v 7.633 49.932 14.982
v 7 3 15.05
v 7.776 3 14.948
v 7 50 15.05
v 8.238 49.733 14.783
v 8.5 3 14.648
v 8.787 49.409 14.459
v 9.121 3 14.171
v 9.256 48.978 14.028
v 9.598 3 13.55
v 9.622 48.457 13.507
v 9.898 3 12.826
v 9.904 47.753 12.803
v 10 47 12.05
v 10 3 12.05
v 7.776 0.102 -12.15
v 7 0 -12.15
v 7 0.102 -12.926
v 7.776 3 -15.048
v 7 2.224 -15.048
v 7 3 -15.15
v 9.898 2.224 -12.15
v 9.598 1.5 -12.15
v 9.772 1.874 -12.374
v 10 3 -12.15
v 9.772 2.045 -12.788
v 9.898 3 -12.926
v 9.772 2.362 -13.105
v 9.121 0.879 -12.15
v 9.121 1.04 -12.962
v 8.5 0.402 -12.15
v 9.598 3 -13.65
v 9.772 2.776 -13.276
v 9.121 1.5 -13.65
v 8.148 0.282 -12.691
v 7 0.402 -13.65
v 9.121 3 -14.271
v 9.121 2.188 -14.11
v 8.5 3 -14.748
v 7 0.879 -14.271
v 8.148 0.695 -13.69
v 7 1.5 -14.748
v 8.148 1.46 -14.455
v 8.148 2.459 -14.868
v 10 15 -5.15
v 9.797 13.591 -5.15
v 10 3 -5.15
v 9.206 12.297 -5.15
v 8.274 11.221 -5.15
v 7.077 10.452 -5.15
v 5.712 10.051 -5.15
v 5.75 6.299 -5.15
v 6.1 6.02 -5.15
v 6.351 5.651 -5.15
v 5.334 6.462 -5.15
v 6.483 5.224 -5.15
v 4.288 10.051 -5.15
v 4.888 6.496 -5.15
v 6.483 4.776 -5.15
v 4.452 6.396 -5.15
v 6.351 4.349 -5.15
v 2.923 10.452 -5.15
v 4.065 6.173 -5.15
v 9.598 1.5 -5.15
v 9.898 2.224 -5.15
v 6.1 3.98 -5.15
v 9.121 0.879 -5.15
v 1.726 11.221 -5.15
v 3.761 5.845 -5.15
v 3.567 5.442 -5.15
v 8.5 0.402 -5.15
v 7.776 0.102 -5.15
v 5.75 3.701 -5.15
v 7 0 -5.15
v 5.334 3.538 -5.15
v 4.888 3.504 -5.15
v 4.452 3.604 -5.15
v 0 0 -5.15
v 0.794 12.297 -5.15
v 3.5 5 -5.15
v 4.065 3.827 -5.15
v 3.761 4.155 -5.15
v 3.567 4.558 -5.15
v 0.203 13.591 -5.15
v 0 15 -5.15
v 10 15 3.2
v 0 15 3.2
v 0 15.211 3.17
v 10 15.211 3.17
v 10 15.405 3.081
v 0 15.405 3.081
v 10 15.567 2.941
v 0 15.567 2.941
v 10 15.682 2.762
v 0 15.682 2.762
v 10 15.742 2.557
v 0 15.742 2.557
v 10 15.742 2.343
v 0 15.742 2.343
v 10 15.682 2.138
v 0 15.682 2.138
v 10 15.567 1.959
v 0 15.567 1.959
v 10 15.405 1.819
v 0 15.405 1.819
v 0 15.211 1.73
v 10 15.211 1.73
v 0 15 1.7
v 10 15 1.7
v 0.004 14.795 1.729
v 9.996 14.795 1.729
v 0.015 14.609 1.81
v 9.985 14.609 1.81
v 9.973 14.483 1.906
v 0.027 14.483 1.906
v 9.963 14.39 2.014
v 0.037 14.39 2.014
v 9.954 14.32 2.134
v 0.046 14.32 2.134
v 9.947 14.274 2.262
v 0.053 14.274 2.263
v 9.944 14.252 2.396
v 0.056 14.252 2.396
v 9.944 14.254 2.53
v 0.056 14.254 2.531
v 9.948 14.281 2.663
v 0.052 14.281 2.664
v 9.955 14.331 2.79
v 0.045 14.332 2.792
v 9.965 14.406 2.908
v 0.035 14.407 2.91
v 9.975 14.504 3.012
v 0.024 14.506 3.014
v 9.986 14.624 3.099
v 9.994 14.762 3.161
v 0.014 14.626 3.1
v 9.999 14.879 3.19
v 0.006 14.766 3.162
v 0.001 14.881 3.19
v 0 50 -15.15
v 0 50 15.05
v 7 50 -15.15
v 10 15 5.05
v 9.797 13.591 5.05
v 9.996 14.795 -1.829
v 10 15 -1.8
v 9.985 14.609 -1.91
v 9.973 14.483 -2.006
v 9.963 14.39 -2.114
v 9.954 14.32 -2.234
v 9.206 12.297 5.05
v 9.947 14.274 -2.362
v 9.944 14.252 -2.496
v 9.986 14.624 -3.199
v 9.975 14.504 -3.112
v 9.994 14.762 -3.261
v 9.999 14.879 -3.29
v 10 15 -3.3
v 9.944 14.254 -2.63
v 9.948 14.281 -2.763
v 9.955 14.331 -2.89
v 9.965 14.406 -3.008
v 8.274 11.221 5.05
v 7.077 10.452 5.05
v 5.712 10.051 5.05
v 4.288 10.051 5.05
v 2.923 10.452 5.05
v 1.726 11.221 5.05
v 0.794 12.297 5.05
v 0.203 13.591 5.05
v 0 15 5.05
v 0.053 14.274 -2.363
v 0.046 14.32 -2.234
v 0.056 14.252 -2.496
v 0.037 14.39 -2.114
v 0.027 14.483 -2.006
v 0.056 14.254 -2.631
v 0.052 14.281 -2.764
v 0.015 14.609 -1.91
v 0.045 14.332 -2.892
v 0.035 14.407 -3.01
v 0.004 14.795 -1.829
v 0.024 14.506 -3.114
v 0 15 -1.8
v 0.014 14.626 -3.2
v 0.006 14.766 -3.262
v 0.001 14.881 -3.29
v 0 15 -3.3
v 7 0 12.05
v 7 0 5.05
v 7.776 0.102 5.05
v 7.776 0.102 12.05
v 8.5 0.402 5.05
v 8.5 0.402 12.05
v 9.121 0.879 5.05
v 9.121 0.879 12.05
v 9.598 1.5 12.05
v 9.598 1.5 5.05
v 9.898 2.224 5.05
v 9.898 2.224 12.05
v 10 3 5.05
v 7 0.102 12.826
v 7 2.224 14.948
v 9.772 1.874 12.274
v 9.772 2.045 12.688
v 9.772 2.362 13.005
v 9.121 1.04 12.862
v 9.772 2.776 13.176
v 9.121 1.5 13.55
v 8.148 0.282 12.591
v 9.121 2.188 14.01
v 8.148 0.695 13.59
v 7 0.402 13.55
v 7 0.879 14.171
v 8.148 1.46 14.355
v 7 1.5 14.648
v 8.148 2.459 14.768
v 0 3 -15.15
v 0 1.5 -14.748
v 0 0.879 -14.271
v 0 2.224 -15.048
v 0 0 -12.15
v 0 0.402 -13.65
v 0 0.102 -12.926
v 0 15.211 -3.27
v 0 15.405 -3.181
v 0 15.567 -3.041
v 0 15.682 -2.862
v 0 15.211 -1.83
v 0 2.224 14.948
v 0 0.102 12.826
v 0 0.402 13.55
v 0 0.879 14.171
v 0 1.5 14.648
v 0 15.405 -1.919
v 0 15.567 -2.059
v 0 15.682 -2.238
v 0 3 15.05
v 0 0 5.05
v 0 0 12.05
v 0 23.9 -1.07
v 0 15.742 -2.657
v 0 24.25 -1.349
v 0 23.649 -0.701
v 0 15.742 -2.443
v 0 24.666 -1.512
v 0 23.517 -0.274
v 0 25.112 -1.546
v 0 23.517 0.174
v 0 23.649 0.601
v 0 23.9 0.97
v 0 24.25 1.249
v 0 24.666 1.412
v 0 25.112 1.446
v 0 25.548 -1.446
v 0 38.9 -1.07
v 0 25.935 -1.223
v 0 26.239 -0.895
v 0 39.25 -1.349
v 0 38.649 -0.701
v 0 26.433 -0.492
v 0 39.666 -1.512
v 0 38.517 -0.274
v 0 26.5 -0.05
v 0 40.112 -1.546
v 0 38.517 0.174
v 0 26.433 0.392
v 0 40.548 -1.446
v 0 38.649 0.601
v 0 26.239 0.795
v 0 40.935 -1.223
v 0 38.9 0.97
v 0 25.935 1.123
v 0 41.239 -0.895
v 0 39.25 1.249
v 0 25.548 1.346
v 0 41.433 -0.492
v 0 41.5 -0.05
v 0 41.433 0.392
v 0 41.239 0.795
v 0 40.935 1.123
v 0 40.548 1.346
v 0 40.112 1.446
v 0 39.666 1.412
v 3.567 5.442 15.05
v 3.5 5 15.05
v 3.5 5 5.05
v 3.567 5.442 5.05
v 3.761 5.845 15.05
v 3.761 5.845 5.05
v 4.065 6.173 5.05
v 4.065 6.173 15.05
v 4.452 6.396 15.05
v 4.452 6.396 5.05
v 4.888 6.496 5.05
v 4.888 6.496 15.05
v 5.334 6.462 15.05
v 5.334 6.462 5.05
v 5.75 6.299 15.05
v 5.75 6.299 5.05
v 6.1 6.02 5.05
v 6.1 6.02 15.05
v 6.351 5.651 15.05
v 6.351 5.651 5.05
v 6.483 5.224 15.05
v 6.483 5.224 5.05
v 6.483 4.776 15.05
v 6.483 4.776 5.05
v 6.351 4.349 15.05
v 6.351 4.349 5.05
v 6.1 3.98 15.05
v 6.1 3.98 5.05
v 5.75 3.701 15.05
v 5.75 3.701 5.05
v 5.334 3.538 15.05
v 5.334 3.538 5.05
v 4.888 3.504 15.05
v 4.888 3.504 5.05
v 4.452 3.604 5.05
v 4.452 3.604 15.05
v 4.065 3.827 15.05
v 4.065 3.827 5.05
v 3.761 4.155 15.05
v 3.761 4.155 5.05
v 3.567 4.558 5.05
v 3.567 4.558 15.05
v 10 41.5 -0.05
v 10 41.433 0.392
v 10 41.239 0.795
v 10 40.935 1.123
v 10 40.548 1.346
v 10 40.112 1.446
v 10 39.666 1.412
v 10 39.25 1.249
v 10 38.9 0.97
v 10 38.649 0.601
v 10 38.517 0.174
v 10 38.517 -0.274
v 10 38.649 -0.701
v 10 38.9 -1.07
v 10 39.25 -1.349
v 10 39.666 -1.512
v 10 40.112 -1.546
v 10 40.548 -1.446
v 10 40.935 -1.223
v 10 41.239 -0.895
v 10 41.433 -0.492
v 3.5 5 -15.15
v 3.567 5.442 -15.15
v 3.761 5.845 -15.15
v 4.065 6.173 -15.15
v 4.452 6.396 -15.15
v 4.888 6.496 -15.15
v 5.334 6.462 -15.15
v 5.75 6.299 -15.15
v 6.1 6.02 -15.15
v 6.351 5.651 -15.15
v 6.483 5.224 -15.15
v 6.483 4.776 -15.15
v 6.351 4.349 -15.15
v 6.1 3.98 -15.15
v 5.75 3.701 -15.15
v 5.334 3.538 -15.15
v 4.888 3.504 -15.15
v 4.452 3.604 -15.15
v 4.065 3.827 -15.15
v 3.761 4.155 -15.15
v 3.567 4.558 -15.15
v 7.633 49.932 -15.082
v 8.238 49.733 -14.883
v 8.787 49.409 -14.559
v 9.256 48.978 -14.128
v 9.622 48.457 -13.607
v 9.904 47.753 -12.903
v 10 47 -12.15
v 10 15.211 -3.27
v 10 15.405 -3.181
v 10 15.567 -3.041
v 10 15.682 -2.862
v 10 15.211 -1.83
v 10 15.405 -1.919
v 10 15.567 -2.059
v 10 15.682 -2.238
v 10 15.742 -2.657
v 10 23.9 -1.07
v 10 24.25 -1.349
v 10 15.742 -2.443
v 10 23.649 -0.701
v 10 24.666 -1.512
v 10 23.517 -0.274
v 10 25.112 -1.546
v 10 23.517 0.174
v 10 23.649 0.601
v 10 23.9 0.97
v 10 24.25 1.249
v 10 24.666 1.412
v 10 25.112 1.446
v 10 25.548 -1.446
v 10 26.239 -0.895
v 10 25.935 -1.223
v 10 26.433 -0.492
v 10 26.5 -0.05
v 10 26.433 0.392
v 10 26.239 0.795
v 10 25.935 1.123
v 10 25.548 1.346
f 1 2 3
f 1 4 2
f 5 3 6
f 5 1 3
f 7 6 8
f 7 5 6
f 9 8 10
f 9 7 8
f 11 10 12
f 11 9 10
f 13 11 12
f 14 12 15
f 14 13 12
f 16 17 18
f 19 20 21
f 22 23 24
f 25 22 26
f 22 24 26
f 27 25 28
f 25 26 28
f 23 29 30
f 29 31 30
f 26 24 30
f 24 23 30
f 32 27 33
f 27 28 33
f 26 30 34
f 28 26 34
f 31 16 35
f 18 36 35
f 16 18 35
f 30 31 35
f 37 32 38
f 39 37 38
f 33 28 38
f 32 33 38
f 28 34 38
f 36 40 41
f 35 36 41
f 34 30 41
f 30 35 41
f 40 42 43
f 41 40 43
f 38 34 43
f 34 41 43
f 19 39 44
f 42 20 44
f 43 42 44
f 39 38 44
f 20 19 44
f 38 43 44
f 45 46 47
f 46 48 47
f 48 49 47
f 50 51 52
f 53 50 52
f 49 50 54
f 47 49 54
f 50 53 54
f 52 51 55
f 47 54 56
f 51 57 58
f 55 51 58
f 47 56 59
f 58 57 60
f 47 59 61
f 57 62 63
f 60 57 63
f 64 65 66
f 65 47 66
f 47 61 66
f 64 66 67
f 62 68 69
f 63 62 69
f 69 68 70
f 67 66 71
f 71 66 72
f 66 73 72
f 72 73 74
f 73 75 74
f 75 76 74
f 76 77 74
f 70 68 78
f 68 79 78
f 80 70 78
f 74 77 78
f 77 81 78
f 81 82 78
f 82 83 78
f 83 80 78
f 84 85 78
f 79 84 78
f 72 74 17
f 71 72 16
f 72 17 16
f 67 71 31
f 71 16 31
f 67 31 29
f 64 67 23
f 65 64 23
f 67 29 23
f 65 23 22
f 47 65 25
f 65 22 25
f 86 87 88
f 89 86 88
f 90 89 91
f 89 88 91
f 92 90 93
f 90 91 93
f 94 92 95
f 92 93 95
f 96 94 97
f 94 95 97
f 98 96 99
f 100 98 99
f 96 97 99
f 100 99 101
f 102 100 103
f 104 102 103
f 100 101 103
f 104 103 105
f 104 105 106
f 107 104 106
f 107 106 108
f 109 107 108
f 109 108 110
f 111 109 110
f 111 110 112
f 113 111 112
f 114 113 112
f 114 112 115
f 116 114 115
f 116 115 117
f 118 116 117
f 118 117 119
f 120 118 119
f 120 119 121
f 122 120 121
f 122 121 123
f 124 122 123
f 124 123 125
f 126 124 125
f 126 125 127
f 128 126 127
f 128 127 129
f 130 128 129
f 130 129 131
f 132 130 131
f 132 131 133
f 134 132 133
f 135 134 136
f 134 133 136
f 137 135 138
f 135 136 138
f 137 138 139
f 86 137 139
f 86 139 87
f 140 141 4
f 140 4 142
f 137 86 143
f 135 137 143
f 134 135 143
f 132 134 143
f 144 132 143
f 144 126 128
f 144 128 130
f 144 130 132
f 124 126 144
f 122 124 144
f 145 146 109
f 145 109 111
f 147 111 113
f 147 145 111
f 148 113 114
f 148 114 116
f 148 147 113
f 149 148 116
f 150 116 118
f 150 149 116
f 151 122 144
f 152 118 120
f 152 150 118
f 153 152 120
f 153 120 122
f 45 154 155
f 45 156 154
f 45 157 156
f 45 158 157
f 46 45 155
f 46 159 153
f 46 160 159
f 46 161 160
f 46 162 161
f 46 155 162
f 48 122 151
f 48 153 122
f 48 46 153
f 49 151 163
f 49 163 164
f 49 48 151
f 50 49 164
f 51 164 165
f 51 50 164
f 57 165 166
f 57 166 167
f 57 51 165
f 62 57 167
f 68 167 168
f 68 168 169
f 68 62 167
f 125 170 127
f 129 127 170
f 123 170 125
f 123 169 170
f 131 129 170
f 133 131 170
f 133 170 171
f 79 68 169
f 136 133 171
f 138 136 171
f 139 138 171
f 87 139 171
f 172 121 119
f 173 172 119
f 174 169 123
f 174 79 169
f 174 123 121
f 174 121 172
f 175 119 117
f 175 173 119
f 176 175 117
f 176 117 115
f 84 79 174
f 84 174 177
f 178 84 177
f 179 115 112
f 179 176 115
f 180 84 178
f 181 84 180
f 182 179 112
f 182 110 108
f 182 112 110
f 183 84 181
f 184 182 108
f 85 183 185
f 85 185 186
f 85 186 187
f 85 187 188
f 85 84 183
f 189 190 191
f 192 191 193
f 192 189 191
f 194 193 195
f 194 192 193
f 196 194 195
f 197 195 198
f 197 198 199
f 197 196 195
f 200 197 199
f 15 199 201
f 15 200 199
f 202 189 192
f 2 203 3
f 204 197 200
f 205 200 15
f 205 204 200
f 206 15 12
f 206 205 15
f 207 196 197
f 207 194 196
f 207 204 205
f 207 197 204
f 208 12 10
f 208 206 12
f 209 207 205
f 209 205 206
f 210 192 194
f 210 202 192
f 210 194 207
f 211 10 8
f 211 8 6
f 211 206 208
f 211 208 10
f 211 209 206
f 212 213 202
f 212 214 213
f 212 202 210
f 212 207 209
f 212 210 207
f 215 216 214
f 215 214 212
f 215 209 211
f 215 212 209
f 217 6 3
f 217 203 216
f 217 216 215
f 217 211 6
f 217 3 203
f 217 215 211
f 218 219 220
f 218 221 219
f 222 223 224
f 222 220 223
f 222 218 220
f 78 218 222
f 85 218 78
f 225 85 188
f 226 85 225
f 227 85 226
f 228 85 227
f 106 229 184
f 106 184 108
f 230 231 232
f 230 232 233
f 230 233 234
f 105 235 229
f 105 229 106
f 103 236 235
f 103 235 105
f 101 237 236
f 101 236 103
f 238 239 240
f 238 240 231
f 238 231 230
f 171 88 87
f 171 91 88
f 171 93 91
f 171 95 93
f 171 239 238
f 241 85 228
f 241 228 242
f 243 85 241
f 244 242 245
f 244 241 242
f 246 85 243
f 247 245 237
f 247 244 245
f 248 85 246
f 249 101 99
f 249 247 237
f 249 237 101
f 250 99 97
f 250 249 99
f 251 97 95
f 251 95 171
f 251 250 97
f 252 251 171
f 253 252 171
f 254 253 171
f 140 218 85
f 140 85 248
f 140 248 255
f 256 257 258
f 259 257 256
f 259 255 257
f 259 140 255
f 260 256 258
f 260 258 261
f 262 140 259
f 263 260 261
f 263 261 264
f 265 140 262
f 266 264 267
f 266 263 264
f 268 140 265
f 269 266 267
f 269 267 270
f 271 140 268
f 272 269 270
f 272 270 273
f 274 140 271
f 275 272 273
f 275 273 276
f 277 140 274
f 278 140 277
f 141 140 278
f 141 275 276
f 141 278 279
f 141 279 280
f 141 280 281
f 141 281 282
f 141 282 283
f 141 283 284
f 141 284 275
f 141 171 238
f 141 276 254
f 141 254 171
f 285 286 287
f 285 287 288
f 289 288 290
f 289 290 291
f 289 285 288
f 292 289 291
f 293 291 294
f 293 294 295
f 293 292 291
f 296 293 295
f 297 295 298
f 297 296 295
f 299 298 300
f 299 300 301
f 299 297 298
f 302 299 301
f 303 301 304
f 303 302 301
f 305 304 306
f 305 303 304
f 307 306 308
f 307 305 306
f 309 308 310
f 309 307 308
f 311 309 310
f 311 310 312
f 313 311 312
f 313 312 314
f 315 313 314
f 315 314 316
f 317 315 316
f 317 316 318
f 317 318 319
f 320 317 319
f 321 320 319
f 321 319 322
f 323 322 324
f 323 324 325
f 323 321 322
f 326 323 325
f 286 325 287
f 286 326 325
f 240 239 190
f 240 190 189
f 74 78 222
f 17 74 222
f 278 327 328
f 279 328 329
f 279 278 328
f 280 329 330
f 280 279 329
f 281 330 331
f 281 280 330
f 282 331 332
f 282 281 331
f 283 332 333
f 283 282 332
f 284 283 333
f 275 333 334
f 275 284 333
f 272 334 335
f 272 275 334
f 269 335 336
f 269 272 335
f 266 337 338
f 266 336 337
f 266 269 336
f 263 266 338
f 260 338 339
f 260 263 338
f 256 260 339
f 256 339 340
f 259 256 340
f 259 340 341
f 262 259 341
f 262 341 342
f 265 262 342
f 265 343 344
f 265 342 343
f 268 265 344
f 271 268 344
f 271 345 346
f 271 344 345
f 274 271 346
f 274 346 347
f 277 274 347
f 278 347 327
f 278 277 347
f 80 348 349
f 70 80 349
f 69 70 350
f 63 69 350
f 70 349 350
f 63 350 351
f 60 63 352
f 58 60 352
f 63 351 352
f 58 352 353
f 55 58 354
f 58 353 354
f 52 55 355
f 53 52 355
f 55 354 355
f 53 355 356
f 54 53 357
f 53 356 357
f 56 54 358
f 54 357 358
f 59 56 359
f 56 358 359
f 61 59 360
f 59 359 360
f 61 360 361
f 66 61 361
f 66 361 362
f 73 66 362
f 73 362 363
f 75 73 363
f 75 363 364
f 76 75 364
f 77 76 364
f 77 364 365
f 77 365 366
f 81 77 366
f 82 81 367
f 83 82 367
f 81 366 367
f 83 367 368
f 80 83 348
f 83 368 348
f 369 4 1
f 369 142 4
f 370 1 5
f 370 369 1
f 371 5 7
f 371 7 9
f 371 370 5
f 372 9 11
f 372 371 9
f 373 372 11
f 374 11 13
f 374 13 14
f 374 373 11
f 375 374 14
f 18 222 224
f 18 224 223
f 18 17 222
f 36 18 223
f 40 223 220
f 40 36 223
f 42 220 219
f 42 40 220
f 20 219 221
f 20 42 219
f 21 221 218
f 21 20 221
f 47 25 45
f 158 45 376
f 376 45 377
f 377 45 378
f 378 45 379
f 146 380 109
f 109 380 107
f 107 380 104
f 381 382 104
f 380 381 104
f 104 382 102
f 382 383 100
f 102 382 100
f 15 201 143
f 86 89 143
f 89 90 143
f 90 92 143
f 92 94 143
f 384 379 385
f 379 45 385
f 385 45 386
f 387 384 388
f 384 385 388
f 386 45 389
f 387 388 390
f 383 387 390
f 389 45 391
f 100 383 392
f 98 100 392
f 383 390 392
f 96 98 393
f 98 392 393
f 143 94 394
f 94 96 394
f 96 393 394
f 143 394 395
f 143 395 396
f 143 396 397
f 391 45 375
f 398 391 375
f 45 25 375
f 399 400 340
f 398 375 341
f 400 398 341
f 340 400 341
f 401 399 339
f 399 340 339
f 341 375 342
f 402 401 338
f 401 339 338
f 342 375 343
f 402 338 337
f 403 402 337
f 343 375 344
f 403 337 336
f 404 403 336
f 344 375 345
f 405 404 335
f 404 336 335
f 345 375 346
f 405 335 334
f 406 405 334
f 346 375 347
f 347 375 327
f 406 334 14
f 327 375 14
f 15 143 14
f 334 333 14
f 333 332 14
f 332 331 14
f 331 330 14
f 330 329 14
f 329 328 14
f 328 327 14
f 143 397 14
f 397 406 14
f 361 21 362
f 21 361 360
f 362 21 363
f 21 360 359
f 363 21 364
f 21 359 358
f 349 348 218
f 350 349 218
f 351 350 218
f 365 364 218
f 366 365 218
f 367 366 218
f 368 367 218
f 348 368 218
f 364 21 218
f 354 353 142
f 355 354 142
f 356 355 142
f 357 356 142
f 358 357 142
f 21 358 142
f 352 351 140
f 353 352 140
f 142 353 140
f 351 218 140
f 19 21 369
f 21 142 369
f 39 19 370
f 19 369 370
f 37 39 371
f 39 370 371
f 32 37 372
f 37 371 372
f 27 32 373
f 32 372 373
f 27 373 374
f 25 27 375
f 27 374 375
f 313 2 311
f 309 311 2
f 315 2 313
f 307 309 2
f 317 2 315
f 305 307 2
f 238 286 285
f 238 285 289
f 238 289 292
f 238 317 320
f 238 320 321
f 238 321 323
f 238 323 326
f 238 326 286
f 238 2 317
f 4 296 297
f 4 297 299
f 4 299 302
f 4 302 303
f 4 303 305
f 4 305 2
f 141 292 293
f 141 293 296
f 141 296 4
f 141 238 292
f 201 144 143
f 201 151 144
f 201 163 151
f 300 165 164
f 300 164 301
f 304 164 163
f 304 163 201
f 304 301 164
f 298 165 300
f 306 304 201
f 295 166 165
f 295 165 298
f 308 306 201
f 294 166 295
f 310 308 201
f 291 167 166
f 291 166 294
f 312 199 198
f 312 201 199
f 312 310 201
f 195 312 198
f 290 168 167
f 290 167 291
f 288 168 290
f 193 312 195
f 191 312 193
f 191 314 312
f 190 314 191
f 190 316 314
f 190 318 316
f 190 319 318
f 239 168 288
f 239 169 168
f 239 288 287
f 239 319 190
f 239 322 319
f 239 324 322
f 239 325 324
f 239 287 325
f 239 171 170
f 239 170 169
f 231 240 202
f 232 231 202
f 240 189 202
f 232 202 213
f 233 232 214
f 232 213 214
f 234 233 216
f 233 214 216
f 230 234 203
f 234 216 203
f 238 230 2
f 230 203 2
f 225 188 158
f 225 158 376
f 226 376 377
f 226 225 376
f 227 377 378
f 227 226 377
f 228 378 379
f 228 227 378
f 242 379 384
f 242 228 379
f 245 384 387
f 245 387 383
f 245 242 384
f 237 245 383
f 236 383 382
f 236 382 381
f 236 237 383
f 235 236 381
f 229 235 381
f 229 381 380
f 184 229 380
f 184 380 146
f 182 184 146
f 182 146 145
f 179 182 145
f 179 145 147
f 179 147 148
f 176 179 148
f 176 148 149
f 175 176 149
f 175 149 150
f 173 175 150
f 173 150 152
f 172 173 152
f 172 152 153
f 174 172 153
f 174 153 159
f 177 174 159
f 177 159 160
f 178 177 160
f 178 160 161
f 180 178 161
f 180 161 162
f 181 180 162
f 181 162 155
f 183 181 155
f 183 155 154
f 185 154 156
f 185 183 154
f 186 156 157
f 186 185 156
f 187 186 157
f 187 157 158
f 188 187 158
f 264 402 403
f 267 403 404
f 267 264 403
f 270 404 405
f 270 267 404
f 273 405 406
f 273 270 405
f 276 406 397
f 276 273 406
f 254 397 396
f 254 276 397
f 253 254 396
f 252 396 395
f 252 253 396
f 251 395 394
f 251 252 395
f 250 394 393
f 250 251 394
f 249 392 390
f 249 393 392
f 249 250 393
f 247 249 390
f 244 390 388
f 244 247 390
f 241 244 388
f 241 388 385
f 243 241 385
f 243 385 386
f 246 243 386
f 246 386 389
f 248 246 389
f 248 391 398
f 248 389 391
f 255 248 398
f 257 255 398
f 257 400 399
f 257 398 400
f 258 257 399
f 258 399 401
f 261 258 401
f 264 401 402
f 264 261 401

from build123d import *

# Parameters (mm, degrees)
SKETCH1_R           = 0.75
BOSS_EXTRUDE1_DEPTH = 10
FILLET1_R           = 3
FILLET2_R           = 5
SKETCH2_R           = 1.5
CUT_EXTRUDE1_DEPTH  = 10


# Read off the part's stored shape, not the designer's step: Mirror10
with BuildPart() as part:
    # Sketch1 → Boss-Extrude1 (new body)
    with BuildSketch(Plane(origin=(0, 0, 0), x_dir=(0, 0, -1), z_dir=(1, 0, 0))):
        with BuildLine():
            Line((5.15, 0), (15.15, 0))
            Line((15.15, 0), (15.15, 50))
            Line((15.15, 50), (0.05, 50))
            Line((0.05, 50), (0.05, 41.5))
            ThreePointArc((0.05, 41.5), (1.55, 40), (0.05, 38.5))
            Line((0.05, 38.5), (0.05, 26.5))
            ThreePointArc((0.05, 26.5), (1.55, 25), (0.05, 23.5))
            Line((0.05, 23.5), (0.05, 10))
            Line((0.05, 10), (5.15, 10))
            Line((5.15, 10), (5.15, 0))
        make_face()
        with Locations((2.55, 15)):
            Circle(SKETCH1_R, mode=Mode.SUBTRACT)
    extrude(amount=BOSS_EXTRUDE1_DEPTH)

    # Fillet1
    fillet1_edges = [part.edges().sort_by_distance(p)[0] for p in [
        (5, 0, -15.15),
        (10, 0, -10.15),
        (10, 25, -15.15),
        (10, 50, -7.6),
    ]]
    fillet(fillet1_edges, radius=FILLET1_R)

    # Fillet2
    # the kernel refuses this fillet: 5 mm, written as the material it takes off along each edge
    with BuildSketch(Plane(origin=(0, 10, 12.45), x_dir=(0, 1, 0), z_dir=(0, 0, -1))) as fillet2_piece_1:
        with BuildLine():
            CenterArc((FILLET2_R, FILLET2_R), FILLET2_R, 180, 90)
            Line((0, FILLET2_R), (0, 0))
            Line((0, 0), (FILLET2_R, 0))
        make_face()
    extrude(amount=17.6, mode=Mode.SUBTRACT)
    with BuildSketch(Plane(origin=(10, 10, 12.45), x_dir=(0, 1, 0), z_dir=(0, 0, -1))) as fillet2_piece_2:
        with BuildLine():
            CenterArc((FILLET2_R, -FILLET2_R), FILLET2_R, 90, 90)
            Line((0, -FILLET2_R), (0, 0))
            Line((0, 0), (FILLET2_R, 0))
        make_face()
    extrude(amount=17.6, mode=Mode.SUBTRACT)

    # Sketch2 → Cut-Extrude1 (cut)
    with BuildSketch(Plane(origin=(0, 0, -15.15), x_dir=(-1, 0, 0), z_dir=(0, 0, -1))):
        with Locations((-5, 5)):
            Circle(SKETCH2_R)
    extrude(amount=-CUT_EXTRUDE1_DEPTH, mode=Mode.SUBTRACT)

    # Mirror10: part across plane


with BuildPart() as part_1:
    add(part.part)
    add(part.part.mirror(Plane(origin=(10, 50, -0.05), x_dir=(1, 0, 0), z_dir=(0, 0, -1))))


solid = part_1.part
